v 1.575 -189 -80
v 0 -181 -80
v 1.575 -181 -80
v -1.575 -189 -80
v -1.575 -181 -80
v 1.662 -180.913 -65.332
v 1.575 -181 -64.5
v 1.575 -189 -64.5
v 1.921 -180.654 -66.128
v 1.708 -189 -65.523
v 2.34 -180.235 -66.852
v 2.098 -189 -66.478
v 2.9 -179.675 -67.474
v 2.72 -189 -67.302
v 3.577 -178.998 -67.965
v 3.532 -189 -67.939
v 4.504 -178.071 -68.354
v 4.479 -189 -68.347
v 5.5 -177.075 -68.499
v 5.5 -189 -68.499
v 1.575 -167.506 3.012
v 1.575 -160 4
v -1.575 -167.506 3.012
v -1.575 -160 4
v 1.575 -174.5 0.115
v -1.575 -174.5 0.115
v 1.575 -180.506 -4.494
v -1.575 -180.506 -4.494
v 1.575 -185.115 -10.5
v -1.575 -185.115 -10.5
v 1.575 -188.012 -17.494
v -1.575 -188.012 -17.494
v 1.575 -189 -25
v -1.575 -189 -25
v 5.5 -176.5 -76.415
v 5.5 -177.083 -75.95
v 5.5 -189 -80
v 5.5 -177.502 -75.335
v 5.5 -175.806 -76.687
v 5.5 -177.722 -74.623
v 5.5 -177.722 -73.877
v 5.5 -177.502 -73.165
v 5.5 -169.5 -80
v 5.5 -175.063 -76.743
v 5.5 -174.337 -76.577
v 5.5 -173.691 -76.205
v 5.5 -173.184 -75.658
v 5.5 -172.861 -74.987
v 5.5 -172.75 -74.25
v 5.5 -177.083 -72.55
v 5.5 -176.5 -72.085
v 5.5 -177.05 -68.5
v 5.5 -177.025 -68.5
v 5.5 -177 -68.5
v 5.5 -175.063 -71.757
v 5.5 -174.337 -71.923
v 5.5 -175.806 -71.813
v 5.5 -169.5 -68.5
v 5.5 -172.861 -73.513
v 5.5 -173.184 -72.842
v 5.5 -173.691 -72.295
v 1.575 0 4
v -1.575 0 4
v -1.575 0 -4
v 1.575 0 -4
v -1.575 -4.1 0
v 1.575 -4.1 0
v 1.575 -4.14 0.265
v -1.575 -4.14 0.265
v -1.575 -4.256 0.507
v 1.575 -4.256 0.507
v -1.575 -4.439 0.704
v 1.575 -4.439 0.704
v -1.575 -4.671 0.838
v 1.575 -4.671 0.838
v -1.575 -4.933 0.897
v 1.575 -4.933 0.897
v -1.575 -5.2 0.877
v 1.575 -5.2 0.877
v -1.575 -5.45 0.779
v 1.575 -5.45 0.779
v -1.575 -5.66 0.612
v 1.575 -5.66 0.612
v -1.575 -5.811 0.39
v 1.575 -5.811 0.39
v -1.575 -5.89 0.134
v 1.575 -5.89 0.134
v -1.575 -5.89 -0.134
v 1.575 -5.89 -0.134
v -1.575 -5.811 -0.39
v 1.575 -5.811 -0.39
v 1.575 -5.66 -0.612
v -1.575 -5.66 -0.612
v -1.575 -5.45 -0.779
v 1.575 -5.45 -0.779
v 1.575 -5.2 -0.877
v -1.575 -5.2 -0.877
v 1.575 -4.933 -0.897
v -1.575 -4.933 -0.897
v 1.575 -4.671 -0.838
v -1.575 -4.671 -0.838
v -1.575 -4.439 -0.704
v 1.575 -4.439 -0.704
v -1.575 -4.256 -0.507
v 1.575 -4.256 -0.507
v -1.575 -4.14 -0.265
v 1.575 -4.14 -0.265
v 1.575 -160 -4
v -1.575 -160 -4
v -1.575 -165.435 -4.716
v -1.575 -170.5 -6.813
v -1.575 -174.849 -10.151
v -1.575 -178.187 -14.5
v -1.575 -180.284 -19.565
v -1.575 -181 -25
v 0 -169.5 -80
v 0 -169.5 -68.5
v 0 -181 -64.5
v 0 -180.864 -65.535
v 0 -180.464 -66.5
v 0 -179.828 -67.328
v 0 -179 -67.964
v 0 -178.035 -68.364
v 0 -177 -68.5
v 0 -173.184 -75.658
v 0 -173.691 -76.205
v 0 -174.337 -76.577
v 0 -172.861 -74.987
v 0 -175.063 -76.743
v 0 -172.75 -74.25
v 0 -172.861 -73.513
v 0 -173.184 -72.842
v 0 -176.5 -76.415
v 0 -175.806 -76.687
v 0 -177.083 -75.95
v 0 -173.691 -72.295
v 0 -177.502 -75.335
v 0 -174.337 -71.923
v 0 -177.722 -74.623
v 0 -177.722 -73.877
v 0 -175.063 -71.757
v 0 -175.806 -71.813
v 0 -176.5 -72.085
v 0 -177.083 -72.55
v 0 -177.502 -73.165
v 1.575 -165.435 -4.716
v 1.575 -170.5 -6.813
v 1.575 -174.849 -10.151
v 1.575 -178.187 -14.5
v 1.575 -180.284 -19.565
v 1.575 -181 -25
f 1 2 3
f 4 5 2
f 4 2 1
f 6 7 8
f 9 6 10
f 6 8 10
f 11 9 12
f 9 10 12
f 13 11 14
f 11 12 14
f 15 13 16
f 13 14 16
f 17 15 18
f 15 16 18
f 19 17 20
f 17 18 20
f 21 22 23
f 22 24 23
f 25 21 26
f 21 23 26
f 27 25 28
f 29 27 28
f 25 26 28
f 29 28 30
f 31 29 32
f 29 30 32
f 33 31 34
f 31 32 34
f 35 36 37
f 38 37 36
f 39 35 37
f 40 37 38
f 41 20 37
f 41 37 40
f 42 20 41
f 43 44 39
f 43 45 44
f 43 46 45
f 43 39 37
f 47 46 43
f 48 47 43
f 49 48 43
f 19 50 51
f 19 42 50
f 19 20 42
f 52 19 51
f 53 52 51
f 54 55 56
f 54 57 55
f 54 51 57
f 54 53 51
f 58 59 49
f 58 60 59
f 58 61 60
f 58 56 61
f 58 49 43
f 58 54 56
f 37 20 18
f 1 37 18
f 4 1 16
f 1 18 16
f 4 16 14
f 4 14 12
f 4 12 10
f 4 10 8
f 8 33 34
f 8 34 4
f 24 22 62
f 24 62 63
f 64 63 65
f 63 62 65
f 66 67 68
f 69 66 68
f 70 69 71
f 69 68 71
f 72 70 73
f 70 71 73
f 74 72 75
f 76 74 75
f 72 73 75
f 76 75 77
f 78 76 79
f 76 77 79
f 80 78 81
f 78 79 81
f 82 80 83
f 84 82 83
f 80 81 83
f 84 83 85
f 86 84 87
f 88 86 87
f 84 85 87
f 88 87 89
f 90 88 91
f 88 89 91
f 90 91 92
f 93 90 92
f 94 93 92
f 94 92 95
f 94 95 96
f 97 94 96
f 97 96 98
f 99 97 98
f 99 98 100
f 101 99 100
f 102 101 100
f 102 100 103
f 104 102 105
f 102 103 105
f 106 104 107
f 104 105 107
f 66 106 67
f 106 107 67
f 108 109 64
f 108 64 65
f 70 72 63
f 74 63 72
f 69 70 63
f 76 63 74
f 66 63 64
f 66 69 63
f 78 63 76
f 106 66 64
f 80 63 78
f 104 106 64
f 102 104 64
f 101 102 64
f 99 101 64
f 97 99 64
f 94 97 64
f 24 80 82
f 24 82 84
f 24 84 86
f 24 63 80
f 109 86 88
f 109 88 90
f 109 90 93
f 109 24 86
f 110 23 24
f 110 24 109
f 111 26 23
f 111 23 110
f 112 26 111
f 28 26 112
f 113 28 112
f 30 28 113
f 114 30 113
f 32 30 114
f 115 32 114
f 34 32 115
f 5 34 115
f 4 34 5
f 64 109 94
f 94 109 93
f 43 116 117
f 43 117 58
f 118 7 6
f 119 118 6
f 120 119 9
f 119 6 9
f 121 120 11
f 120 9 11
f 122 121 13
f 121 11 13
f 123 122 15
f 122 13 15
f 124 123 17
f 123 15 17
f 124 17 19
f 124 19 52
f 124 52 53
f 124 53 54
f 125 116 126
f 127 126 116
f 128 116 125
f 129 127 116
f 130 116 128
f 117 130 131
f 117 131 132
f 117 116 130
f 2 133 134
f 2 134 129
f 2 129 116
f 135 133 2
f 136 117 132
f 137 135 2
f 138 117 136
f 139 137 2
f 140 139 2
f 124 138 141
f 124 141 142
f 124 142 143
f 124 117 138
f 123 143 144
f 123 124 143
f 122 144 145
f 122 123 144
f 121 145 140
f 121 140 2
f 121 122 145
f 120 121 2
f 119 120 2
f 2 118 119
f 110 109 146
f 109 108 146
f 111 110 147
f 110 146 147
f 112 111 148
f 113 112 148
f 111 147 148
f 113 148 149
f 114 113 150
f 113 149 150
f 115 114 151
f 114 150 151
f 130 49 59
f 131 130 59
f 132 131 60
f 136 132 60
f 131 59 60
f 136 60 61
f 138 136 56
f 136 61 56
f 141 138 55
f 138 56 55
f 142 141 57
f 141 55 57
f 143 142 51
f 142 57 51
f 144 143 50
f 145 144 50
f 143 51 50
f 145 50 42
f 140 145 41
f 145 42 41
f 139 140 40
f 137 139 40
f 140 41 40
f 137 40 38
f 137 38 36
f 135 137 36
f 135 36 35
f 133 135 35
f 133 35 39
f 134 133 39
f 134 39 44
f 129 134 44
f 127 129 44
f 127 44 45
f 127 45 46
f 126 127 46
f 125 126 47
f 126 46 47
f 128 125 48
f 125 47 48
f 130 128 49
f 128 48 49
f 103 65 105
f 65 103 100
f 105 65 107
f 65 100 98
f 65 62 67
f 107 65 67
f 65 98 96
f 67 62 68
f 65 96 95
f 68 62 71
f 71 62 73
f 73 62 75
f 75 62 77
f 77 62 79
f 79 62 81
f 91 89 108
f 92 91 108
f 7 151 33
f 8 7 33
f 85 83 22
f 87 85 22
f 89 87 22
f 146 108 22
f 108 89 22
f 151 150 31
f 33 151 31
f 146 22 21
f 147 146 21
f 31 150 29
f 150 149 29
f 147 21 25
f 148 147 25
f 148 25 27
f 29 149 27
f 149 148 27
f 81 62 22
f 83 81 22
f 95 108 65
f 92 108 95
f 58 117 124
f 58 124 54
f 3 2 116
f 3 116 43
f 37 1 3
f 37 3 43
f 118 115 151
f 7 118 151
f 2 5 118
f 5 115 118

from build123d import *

# Parameters (mm, degrees)
F2_W         = 3.15
F2_H         = 8
F4_W         = 5.5
F4_H         = 19.5
F5_DEPTH     = 11.5
F6_R         = 2.5
F7_DEPTH     = 5.5
F8_T1_DEPTH  = 1.575
F8_T6_DEPTH  = 8
F8_T12_DEPTH = 18
F8_T17_DEPTH = 11.575
F9_R         = 0.9
F10_DEPTH    = 3.15


# Not quite as in the source:
# - a fillet or chamfer that OpenCascade refuses, or shapes differently, is made with other operations: its cross-section is extruded or revolved along the edge and cut away or added


with BuildPart() as f3:
    # F3: sweep along a path in F1
    with BuildLine(Plane.YZ) as f3_path:
        Line((0, 0), (-160, 0))
        ThreePointArc((-160, 0), (-177.6776695297, -7.3223304703), (-185, -25))
        Line((-185, -25), (-185, -80))
    # F2 (on Front) → F3 (sweep)
    with BuildSketch(Plane.XZ):
        Rectangle(F2_W, F2_H)
    sweep(path=f3_path.line)

    # F4 (on face) → F5 (join)
    with BuildSketch(Plane(origin=(0, 0, -80), x_dir=(1, 0, 0), z_dir=(0, 0, -1))):
        with Locations((2.75, 179.25)):
            Rectangle(F4_W, F4_H)
    extrude(amount=-F5_DEPTH)

    # F6 (on face) → F7 (cut, through all)
    with BuildSketch(Plane.YZ.offset(5.5)):
        with Locations((-175.25, -74.25)):
            Circle(F6_R)
    extrude(amount=-F7_DEPTH, mode=Mode.SUBTRACT)

    # F8: fillet of radius 4 on 2 edges, made by hand

    # F8_s2 → F8_t1 (join)
    with BuildSketch(Plane.YZ):
        with BuildLine():
            ThreePointArc((-181, -64.5), (-179.8284271247, -67.3284271247), (-177, -68.5))
            Line((-177, -68.5), (-181, -68.5))
            Line((-181, -68.5), (-181, -64.5))
        make_face()
    extrude(amount=F8_T1_DEPTH)


with BuildPart() as f8_tool4:
    # F8_s5 → F8_t6 (new body)
    with BuildSketch(Plane.XZ.offset(189)):
        with BuildLine():
            ThreePointArc((1.575, -64.5), (2.7465728753, -67.3284271247), (5.575, -68.5))
            Line((5.575, -68.5), (1.575, -68.5))
            Line((1.575, -68.5), (1.575, -64.5))
        make_face()
    extrude(amount=-F8_T6_DEPTH)

    split(bisect_by=Plane.YZ.offset(5.5), keep=Keep.BOTTOM)


with BuildPart() as f3_1:
    add(f3.part)

    # F8_t3: union F8_tool4
    add(f8_tool4.part)


with BuildPart() as f8_tool10:
    # F8_s11 → F8_t12 (new body)
    with BuildSketch(Plane.XZ.offset(189)):
        with BuildLine():
            ThreePointArc((1.575, -64.5), (2.7465728753, -67.3284271247), (5.575, -68.5))
            Line((5.575, -68.5), (1.575, -68.5))
            Line((1.575, -68.5), (1.575, -64.5))
        make_face()
    extrude(amount=-F8_T12_DEPTH)

    split(bisect_by=Plane.XZ.offset(181), keep=Keep.BOTTOM)

    split(bisect_by=Plane.YZ.offset(5.5), keep=Keep.BOTTOM)


with BuildPart() as f8_tool15:
    # F8_s16 → F8_t17 (new body)
    with BuildSketch(Plane.YZ.offset(11.575)):
        with BuildLine():
            ThreePointArc((-181, -64.5), (-179.8284271247, -67.3284271247), (-177, -68.5))
            Line((-177, -68.5), (-181, -68.5))
            Line((-181, -68.5), (-181, -64.5))
        make_face()
    extrude(amount=-F8_T17_DEPTH)

    split(bisect_by=Plane.YZ.offset(1.575), keep=Keep.TOP)

    split(bisect_by=Plane.YZ.offset(5.5), keep=Keep.BOTTOM)


with BuildPart() as f8_tool10_1:
    add(f8_tool10.part)

    # F8_t20: intersect F8_tool15
    add(f8_tool15.part, mode=Mode.INTERSECT)


with BuildPart() as f3_2:
    add(f3_1.part)

    # F8_t8: union F8_tool10
    add(f8_tool10_1.part)

    # F9 (on face) → F10 (cut, through all)
    with BuildSketch(Plane.YZ.offset(1.575)):
        with Locations((-5, 0)):
            Circle(F9_R)
    extrude(amount=-F10_DEPTH, mode=Mode.SUBTRACT)


solid = f3_2.part
